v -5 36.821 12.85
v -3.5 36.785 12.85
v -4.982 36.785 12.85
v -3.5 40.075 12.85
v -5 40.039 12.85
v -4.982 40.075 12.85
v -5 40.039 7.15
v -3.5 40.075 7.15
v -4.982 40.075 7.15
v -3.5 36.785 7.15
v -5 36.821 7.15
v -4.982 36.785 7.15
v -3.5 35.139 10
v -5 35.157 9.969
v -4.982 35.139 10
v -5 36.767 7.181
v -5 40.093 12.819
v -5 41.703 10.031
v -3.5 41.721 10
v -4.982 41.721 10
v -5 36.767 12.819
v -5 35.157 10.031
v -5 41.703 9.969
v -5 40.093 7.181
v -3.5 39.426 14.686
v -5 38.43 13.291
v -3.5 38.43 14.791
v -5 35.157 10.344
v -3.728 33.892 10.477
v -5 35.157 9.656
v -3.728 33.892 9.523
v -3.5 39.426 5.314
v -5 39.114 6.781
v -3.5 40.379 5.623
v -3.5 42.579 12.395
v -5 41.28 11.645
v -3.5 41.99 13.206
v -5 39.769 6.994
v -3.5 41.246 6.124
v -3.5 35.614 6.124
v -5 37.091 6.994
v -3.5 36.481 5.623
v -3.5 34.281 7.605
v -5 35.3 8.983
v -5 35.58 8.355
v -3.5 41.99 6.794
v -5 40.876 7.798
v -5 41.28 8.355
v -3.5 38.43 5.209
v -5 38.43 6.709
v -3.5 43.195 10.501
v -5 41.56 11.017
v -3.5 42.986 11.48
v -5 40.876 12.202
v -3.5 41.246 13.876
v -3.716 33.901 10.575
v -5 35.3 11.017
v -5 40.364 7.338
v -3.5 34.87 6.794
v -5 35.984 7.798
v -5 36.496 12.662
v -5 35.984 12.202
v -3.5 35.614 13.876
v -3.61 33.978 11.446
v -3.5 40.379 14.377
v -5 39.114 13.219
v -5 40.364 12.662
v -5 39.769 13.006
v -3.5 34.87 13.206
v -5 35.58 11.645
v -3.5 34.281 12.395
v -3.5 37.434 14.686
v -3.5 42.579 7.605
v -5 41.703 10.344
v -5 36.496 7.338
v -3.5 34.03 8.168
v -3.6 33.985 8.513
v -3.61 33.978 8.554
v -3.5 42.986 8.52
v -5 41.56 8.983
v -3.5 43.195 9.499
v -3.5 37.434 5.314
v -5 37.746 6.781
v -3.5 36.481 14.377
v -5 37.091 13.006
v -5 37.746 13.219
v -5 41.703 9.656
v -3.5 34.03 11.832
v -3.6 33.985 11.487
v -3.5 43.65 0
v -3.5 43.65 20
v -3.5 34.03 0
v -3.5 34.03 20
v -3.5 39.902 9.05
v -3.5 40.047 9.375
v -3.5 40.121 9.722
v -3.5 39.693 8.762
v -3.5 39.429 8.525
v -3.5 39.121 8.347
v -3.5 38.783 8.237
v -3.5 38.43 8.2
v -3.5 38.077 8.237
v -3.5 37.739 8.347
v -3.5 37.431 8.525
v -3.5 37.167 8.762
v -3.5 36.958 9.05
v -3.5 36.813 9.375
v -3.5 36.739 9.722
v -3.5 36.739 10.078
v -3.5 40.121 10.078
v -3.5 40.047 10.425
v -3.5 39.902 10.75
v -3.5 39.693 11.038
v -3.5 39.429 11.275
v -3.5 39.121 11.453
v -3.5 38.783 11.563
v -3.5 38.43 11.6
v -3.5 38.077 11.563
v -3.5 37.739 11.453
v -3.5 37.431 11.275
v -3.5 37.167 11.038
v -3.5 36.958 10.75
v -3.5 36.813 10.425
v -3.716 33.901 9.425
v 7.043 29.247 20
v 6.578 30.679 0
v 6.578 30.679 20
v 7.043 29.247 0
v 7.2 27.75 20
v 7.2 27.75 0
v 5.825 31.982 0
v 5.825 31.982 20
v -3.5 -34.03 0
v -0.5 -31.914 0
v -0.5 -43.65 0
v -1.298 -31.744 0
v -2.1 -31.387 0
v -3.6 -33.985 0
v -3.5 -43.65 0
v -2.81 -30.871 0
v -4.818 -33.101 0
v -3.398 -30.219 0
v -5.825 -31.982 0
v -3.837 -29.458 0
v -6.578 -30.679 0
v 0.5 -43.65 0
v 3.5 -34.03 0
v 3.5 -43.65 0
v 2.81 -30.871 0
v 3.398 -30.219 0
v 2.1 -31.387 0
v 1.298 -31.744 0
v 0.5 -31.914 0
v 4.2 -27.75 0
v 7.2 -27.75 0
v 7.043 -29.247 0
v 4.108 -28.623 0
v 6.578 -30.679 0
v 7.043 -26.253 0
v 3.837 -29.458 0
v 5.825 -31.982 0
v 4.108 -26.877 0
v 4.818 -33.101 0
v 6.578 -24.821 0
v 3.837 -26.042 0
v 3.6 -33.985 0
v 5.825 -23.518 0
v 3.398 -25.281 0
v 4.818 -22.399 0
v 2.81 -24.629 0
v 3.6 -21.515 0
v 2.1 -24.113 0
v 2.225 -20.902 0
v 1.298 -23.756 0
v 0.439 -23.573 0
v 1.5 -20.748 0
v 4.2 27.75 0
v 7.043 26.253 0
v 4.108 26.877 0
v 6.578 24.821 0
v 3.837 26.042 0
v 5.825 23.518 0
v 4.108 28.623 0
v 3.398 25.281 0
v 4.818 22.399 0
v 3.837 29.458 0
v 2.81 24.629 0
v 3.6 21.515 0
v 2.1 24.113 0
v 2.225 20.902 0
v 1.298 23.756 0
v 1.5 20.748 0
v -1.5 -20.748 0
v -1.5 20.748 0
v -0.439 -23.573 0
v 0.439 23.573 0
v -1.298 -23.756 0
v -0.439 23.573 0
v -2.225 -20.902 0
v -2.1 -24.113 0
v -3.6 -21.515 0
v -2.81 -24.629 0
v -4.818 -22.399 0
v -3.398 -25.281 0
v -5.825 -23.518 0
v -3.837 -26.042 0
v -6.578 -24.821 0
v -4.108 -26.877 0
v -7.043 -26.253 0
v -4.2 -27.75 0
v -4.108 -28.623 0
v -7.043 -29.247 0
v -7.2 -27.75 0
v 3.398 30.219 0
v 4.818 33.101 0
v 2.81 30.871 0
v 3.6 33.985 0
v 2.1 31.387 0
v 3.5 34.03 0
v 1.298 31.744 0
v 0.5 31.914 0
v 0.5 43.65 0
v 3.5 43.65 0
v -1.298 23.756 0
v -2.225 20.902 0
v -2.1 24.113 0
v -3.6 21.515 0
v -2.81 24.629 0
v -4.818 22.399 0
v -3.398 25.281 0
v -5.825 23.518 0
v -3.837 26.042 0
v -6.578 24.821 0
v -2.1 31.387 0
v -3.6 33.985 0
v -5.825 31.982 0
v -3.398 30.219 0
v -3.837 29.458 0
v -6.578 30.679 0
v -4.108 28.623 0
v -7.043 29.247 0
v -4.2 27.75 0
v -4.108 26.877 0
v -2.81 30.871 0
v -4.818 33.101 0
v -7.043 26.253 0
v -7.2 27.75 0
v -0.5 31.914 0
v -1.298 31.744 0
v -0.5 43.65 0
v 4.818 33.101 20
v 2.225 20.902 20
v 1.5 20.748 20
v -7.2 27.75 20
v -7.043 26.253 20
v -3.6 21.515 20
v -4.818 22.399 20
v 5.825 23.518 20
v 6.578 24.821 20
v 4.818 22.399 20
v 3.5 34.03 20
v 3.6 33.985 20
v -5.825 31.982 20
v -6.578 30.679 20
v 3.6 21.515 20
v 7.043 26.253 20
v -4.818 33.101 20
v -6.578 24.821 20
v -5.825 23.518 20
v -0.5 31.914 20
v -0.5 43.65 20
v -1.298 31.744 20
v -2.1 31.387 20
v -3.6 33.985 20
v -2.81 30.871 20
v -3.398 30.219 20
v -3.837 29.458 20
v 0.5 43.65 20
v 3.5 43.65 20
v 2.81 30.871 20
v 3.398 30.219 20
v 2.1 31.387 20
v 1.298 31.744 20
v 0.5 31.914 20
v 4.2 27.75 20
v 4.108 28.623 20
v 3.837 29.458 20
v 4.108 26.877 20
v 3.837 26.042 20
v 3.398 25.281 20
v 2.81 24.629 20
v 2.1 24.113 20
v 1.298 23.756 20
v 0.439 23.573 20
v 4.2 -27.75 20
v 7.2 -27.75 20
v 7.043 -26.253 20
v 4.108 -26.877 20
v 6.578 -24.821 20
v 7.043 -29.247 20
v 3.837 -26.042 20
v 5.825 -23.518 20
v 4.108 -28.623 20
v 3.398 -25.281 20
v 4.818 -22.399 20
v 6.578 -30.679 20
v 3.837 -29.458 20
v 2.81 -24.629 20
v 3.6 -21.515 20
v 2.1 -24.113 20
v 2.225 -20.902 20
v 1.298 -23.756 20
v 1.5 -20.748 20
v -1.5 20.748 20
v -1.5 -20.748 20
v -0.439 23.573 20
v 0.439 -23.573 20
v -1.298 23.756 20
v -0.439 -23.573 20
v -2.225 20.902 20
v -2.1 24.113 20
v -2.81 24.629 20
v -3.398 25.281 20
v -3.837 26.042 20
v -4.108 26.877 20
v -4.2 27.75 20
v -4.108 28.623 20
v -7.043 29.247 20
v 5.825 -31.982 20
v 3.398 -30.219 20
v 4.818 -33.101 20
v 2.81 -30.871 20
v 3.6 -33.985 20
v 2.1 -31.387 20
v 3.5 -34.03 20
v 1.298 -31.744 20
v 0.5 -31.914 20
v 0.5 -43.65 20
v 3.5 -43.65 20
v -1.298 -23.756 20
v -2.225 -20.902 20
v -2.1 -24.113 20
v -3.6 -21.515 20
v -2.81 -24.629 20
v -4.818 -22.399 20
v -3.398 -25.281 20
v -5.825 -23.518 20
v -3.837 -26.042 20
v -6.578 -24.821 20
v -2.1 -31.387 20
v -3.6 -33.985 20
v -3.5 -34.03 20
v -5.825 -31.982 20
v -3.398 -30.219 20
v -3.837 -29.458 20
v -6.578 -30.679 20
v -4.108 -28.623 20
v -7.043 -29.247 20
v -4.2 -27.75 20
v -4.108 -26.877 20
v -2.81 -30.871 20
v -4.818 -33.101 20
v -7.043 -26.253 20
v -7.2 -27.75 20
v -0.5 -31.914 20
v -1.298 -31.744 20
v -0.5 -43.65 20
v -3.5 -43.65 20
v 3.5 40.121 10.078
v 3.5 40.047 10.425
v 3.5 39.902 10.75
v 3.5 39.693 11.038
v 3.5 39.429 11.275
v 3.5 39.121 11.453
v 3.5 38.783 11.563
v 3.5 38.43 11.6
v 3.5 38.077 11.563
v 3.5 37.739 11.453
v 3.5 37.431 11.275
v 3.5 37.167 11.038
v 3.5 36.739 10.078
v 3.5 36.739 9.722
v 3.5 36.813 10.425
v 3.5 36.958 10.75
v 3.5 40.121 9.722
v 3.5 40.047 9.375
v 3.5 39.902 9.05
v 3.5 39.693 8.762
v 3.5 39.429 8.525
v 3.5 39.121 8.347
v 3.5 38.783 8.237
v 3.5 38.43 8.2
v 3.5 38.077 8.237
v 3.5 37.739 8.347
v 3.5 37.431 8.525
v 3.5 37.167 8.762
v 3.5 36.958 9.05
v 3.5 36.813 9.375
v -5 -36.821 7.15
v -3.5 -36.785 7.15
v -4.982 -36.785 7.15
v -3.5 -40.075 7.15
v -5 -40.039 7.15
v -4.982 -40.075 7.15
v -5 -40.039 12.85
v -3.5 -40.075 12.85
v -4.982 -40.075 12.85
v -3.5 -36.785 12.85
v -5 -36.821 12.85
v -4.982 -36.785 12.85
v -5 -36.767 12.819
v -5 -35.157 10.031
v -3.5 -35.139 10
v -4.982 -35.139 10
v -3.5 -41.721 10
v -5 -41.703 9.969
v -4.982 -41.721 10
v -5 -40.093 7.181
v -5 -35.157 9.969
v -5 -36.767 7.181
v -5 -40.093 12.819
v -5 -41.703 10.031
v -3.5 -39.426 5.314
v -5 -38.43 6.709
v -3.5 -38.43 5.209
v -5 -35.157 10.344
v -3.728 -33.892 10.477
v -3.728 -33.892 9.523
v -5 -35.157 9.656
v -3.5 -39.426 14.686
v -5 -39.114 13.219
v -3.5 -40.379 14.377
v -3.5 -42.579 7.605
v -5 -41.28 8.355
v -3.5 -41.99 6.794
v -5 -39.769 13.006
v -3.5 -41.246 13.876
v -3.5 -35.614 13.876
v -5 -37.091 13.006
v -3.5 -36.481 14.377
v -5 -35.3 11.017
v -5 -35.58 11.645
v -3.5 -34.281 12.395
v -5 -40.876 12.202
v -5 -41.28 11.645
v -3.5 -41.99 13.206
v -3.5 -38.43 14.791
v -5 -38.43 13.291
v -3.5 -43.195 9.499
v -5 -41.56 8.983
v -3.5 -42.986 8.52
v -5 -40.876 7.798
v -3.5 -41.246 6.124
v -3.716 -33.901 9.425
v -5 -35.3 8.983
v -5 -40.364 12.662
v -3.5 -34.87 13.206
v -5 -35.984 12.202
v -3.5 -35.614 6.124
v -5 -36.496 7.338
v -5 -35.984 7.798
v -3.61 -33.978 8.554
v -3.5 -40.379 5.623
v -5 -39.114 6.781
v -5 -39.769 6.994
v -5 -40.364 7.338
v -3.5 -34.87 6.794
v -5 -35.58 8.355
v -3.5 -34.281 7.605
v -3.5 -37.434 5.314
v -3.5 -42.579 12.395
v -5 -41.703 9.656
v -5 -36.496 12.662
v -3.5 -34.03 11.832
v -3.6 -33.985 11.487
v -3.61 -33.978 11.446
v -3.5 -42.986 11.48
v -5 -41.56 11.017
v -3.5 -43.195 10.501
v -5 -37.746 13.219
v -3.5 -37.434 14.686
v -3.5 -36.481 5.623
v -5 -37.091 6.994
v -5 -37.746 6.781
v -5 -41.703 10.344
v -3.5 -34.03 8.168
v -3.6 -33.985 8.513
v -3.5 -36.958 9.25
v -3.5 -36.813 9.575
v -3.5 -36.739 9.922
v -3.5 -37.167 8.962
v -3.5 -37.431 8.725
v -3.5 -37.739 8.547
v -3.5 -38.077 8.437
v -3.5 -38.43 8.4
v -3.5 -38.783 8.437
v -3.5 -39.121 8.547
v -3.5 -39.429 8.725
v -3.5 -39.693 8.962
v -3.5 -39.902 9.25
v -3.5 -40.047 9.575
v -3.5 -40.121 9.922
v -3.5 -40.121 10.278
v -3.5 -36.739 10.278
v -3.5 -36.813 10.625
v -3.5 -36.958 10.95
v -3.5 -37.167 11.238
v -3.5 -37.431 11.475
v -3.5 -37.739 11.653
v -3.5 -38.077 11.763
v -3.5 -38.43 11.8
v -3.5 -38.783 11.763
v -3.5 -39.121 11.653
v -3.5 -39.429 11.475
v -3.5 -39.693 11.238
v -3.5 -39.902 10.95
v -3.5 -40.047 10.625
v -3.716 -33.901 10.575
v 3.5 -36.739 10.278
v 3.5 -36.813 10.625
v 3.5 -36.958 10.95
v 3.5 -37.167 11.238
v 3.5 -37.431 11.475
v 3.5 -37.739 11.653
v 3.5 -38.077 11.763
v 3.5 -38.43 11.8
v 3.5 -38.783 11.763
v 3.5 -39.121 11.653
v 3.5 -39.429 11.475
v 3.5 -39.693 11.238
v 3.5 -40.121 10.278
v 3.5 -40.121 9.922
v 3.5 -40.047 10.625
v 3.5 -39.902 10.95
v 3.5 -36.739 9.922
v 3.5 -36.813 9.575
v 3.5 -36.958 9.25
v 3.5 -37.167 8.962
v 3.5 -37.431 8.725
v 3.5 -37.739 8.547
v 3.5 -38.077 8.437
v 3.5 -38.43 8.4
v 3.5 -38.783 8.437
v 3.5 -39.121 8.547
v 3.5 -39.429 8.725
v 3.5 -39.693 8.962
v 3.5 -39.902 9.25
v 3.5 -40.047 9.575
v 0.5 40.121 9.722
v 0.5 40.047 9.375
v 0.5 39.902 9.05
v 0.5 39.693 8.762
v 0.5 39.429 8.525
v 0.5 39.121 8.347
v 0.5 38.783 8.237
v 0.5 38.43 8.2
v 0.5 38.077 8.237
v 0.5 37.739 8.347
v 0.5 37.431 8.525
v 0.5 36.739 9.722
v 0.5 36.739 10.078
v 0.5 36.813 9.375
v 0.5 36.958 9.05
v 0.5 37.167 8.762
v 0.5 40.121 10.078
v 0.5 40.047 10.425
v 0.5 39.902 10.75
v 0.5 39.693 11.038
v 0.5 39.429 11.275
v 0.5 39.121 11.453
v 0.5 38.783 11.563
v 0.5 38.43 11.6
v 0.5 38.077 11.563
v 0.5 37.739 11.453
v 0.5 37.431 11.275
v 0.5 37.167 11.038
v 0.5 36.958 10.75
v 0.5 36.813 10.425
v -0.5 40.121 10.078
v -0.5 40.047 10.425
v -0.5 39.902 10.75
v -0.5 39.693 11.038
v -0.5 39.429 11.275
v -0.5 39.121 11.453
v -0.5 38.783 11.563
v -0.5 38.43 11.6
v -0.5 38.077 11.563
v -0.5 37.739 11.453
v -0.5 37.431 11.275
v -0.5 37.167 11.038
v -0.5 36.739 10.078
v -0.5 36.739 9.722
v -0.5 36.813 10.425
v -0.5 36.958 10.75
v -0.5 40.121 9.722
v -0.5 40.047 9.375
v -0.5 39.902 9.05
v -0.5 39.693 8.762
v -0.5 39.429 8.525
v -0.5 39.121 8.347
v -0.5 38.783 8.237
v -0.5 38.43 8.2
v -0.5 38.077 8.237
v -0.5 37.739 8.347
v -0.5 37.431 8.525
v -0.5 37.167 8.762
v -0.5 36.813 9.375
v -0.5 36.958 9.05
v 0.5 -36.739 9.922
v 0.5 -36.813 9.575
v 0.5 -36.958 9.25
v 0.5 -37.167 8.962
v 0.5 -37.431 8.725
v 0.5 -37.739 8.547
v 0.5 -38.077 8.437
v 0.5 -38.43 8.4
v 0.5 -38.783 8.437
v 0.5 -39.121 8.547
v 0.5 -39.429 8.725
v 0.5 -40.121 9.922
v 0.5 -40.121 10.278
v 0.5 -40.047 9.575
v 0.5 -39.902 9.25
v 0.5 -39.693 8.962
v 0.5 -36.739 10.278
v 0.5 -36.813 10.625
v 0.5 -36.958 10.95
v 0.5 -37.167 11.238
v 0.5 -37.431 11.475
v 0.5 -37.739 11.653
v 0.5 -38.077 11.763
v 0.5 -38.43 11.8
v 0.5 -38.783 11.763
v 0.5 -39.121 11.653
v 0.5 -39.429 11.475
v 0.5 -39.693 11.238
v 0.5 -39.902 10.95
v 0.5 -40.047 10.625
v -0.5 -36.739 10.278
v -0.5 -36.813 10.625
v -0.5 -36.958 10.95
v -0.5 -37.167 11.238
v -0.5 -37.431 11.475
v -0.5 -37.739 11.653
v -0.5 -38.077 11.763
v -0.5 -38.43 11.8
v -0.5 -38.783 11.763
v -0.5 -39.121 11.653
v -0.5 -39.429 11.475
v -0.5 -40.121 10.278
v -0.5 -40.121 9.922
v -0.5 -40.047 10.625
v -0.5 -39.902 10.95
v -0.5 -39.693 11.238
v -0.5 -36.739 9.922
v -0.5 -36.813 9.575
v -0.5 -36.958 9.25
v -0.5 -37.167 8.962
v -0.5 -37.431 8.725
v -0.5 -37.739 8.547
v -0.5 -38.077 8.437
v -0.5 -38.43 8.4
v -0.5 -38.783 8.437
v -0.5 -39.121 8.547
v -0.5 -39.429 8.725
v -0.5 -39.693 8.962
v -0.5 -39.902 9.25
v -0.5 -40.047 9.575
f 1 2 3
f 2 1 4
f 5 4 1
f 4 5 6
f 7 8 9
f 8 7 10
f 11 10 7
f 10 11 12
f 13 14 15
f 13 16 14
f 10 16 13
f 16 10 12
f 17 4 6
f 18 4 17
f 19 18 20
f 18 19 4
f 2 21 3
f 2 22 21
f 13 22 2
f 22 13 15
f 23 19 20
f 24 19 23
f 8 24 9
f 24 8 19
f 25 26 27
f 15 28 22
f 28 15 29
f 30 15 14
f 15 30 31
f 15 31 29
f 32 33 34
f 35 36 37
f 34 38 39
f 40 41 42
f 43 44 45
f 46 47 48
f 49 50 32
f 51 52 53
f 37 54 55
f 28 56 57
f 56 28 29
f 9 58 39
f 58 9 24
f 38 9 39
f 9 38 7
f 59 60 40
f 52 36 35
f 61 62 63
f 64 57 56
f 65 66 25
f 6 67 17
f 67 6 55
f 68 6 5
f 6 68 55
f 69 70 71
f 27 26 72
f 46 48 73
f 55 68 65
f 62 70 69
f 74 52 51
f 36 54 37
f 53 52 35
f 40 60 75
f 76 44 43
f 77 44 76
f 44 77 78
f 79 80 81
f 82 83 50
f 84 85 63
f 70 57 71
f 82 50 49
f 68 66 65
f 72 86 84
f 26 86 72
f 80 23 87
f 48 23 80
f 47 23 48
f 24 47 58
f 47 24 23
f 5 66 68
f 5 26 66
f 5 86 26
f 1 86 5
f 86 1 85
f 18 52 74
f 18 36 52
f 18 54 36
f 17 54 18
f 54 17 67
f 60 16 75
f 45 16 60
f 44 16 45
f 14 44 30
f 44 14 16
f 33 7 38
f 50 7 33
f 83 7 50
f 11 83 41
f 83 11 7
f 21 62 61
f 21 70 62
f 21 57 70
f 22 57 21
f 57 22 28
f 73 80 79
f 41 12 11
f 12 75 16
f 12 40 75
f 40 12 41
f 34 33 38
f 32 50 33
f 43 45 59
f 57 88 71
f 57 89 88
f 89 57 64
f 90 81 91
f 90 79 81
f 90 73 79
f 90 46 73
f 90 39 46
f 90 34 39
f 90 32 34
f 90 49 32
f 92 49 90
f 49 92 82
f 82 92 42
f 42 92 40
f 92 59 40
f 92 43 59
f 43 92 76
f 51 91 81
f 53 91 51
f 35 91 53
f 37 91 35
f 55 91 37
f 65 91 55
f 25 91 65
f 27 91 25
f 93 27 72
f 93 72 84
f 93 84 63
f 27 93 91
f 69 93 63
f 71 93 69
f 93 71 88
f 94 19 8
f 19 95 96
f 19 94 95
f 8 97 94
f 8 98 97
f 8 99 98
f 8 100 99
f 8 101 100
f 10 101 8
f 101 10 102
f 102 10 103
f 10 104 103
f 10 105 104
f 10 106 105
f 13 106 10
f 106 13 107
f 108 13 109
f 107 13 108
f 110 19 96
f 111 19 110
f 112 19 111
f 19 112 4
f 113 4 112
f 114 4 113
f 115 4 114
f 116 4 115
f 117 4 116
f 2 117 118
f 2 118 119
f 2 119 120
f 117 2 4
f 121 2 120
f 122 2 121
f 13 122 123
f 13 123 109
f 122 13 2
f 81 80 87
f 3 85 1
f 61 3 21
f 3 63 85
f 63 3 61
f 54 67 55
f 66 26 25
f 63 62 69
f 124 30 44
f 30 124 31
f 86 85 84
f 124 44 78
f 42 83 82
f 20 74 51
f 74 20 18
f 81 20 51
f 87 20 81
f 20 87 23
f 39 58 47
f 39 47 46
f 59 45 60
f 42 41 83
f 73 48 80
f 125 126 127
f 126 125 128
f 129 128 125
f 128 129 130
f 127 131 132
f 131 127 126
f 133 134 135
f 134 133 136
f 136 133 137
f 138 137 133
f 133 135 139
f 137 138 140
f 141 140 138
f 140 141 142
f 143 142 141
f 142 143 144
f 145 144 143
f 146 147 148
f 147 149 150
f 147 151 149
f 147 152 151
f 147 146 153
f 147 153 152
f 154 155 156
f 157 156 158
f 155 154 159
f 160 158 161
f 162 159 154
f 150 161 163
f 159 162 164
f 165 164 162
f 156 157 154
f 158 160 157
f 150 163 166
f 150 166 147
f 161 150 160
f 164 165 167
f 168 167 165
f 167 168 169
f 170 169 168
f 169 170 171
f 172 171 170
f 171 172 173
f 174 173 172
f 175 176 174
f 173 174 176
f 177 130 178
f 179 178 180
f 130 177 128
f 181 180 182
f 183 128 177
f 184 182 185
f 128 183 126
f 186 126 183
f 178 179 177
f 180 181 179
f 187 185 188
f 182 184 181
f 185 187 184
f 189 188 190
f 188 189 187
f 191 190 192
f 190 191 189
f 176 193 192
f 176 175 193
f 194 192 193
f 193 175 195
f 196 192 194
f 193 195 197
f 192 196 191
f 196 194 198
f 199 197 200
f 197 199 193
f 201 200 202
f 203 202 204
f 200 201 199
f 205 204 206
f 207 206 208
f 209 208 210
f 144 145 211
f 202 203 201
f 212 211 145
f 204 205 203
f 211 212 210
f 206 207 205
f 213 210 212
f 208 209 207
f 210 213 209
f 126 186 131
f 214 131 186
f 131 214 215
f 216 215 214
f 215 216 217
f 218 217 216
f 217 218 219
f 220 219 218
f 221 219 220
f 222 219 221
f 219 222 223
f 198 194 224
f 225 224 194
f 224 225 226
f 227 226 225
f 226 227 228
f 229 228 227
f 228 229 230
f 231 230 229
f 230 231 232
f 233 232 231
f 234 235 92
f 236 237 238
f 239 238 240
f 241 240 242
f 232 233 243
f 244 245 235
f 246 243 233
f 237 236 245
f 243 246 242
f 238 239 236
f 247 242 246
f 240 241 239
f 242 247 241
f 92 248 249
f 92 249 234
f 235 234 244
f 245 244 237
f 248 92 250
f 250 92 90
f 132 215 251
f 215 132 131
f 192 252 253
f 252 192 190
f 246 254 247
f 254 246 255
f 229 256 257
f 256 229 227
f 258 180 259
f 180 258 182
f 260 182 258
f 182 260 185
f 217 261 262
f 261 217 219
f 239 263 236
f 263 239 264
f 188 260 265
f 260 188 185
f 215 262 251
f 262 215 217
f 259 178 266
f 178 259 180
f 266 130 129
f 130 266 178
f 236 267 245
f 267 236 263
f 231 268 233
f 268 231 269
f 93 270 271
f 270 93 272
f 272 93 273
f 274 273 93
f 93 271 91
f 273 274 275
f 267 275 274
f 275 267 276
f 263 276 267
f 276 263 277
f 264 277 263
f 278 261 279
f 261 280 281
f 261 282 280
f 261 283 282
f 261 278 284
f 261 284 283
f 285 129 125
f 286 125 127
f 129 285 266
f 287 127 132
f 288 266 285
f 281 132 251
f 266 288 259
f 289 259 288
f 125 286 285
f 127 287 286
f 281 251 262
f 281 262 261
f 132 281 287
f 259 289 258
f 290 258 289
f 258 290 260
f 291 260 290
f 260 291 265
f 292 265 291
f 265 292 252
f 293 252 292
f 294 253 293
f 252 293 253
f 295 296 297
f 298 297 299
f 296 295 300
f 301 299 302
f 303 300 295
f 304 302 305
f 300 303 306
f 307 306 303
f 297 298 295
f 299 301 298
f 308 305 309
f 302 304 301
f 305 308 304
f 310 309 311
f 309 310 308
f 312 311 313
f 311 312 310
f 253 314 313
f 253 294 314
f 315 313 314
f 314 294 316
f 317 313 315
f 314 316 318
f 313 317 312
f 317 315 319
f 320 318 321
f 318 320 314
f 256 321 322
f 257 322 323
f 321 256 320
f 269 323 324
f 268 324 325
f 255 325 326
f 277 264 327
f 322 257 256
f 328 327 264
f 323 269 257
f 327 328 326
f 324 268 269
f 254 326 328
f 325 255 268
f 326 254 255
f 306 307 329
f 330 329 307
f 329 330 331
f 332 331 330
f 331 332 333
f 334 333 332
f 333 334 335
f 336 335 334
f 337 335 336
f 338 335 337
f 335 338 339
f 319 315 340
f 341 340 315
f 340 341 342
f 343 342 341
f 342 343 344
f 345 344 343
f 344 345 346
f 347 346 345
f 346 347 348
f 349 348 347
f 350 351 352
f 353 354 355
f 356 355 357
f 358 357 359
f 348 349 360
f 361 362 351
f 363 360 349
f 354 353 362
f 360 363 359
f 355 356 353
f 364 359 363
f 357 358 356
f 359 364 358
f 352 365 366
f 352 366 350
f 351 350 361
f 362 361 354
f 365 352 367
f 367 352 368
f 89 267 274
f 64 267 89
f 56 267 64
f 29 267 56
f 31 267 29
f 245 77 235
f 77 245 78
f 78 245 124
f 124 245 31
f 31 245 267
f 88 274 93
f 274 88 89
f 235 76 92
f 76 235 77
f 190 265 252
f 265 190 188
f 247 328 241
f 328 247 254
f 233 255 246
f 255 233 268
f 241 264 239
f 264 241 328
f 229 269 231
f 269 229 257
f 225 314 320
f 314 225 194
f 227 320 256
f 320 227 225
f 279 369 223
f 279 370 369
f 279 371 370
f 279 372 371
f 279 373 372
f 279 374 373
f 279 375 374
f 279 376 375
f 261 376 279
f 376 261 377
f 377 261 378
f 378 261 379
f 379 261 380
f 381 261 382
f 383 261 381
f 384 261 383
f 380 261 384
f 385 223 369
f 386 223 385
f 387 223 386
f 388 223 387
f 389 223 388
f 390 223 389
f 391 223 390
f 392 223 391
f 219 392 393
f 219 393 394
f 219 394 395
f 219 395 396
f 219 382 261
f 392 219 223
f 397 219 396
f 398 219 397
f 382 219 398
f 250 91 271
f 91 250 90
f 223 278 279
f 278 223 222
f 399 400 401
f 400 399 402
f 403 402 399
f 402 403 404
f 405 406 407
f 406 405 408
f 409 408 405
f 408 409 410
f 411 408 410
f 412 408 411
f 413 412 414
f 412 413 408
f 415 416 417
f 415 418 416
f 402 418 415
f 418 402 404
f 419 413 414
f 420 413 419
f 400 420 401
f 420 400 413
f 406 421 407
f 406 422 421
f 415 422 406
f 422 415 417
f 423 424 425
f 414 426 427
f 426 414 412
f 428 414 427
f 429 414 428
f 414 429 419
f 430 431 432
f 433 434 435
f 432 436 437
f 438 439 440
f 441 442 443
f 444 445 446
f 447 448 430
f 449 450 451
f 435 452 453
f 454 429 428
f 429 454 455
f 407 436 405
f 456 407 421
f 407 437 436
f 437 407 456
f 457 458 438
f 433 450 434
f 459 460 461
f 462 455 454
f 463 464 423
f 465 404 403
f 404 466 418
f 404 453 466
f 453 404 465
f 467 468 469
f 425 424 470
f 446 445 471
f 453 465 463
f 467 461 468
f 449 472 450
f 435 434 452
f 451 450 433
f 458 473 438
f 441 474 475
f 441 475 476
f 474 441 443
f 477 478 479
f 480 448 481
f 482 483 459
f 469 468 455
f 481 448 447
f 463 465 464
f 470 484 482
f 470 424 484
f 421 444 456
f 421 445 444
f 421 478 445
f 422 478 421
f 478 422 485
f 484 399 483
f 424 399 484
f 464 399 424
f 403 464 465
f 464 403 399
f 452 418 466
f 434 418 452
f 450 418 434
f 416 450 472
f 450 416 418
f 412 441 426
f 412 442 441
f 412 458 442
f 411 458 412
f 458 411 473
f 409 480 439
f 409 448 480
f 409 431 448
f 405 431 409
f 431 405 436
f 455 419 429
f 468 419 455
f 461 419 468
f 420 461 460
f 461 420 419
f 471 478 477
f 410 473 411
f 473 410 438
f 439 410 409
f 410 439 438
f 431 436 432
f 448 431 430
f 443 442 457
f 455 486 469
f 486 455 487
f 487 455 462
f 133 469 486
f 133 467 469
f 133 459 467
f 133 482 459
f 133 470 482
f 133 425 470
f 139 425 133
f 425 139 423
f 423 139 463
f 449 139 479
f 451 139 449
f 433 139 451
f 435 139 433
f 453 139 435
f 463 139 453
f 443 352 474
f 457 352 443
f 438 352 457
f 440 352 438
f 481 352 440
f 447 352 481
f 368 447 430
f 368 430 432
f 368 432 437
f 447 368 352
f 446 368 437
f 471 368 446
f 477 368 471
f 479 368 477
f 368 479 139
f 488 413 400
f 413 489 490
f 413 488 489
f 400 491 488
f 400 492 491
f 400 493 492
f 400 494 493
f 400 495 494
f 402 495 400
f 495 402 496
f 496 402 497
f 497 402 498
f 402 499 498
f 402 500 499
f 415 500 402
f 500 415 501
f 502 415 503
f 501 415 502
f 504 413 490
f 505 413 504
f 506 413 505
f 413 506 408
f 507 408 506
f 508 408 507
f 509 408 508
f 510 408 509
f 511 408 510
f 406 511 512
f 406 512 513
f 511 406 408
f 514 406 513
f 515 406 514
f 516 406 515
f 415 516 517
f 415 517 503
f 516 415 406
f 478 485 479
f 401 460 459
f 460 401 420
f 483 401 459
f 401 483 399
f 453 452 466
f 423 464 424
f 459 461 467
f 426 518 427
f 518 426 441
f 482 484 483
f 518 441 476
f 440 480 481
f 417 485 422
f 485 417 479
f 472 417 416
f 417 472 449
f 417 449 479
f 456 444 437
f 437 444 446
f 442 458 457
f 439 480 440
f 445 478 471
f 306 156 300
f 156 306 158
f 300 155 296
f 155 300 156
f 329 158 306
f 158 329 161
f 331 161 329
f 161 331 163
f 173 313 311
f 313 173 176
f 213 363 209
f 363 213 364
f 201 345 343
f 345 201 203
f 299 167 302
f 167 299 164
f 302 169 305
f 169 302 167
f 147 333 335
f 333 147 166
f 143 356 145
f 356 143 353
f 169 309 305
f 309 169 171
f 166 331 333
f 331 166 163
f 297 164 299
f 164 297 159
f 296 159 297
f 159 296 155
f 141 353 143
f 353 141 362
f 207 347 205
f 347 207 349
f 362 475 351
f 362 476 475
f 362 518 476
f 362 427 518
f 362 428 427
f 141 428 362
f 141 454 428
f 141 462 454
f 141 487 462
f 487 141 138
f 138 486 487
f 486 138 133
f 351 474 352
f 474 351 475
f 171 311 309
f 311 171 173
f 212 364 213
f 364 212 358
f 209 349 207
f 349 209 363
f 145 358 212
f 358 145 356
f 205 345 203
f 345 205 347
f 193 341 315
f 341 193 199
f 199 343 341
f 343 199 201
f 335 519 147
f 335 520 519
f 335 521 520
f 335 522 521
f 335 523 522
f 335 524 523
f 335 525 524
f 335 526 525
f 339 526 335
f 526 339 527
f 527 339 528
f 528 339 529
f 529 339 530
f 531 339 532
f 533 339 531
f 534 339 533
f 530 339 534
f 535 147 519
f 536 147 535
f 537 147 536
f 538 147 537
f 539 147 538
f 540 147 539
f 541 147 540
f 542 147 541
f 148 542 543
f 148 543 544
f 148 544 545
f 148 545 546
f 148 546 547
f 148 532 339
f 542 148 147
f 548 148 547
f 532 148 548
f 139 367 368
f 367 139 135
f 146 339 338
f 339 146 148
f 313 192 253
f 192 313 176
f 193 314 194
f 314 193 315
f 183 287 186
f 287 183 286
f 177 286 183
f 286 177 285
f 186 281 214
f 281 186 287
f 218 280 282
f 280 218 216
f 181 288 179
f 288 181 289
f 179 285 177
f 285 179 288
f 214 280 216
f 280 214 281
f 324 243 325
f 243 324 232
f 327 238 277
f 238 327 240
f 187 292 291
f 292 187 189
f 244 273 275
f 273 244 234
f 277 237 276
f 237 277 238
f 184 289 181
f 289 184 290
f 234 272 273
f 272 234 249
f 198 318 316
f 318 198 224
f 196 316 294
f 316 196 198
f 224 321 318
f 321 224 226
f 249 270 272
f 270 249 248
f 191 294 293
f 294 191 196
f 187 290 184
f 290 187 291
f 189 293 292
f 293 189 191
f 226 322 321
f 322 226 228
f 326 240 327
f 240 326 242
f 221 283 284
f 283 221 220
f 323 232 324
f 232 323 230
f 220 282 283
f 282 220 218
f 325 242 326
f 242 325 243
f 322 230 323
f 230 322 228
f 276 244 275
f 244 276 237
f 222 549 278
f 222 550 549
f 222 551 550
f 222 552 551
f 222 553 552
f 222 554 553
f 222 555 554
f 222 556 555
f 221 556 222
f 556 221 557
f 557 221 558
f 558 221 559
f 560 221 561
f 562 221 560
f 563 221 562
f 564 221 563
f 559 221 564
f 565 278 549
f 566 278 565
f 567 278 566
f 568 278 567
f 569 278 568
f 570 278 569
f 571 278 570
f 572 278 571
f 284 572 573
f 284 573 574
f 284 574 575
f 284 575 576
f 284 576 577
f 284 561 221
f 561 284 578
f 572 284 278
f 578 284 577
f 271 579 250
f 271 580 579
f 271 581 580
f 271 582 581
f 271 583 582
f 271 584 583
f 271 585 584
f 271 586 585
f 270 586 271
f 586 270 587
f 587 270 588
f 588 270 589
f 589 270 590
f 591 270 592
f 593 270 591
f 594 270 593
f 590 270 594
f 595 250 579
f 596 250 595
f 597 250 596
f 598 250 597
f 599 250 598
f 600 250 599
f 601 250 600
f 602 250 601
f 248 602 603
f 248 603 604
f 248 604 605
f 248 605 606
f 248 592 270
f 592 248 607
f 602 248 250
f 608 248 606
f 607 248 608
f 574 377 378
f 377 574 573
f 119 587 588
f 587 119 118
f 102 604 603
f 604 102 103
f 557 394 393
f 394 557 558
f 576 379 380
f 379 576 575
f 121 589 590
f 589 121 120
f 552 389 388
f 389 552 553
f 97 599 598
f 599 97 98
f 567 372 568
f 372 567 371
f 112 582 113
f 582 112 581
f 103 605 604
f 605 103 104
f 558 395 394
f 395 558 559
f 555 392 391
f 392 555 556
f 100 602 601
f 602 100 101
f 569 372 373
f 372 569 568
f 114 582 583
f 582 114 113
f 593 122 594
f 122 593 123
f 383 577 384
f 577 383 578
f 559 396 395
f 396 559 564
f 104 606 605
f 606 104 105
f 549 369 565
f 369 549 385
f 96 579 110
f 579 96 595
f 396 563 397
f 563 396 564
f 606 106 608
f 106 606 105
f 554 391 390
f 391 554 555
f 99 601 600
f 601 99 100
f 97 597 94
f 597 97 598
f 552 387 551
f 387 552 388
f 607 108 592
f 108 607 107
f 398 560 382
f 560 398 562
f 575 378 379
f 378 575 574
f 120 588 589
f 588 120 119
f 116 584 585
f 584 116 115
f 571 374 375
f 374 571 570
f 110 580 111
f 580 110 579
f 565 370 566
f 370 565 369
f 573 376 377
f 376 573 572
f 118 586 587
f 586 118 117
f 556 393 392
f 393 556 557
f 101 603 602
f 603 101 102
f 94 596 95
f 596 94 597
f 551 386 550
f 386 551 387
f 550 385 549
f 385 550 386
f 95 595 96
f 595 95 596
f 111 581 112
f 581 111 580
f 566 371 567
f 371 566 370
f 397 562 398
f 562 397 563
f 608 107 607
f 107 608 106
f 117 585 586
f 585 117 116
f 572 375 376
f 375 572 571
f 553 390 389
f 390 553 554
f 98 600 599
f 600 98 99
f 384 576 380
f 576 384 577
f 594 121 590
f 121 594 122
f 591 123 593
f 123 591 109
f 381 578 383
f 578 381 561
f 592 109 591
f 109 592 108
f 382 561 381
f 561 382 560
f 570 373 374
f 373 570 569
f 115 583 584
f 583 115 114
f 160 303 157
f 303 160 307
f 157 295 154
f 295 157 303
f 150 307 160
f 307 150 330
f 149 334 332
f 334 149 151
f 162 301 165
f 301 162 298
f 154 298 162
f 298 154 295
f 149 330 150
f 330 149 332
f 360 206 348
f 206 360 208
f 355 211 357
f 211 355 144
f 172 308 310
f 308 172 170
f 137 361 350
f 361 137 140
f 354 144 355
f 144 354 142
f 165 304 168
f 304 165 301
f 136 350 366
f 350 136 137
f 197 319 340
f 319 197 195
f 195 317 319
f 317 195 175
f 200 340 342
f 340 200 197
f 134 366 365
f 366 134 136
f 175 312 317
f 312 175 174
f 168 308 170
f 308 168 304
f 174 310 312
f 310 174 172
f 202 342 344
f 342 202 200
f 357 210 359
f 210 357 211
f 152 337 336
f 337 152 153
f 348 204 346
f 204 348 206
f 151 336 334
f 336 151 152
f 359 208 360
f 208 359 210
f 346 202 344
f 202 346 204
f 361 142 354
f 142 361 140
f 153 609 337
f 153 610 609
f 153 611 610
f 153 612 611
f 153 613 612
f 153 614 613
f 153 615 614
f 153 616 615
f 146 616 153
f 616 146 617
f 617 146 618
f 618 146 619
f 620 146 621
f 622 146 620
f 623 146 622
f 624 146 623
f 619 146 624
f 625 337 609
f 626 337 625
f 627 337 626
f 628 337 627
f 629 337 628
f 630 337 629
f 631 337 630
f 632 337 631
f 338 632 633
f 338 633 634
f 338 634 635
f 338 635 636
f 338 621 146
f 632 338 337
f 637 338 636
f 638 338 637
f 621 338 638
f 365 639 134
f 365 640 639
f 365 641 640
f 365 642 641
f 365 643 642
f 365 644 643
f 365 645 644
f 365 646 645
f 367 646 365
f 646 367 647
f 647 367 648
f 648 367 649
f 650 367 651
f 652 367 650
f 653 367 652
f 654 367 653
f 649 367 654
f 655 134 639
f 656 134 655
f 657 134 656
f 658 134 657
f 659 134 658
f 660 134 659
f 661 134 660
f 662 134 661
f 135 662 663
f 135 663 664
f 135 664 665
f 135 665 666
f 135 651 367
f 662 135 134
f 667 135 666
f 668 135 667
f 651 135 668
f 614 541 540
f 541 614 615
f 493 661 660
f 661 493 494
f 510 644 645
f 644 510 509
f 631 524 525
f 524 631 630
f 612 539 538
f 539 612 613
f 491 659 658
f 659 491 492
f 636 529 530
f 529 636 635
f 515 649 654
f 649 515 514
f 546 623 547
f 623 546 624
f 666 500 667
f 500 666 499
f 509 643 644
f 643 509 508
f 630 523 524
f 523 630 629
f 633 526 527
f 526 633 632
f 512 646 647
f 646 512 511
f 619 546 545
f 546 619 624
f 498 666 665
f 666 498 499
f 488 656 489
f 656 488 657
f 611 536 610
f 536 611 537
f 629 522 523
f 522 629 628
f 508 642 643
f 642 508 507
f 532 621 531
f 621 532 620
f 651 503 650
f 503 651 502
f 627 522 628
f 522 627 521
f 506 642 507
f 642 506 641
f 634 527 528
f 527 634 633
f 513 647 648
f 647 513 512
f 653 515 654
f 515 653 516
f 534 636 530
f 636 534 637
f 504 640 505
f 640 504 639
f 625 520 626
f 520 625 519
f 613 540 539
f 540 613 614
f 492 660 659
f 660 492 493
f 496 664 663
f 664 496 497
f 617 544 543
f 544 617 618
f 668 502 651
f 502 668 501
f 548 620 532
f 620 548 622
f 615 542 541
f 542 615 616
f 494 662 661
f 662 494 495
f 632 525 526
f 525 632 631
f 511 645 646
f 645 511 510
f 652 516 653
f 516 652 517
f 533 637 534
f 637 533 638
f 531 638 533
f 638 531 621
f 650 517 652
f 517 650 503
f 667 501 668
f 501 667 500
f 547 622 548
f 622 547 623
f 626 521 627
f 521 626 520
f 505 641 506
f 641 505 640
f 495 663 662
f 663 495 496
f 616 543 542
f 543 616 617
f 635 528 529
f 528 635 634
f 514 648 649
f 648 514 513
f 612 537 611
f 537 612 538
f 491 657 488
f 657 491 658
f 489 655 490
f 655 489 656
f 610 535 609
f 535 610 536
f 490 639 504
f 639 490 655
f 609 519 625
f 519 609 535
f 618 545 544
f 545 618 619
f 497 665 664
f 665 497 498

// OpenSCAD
//
//  Mounting brackets for Quanum 680 and other platforms
//  that use twin tubes as equipment mounts
// 
//  by Egil Kvaleberg
//


// platform mounting tube diameter
mount_tube_dia = 8.4;  // leave some space to make fitting easier

// platform mounting tube distance
mount_tube_dist = 55.5;  // center to center (applies to dual)


// tune these:
// example: "dual" / 48 / 65 / 12 / 3
//          "single" / 40 / x / 12 / 3
//          "servo" / x / x / 12 / 3

// type of mounts
mount_type = "dual"; // [ dual, single, servo ]
// offset from center line, use 0 for flat bar
mount_offset = 0.0;
// exit angle from mount 		
mount_angle = 65;
// width of clamp		
mount_width = 20;  
// wall thickness		
mount_wall = 3;		   

//servo_flange_width = 28;
//servo_screw = 2.0;
//servo_flange_height = 16; // height to bottom of mount flange

// for servo mount: flange width
servo_flange_width = 35.0;
// for servo mount: screw diameter
servo_screw = 2.5;
// for servo mount: height to bottom of mount flange
servo_flange_height = 20.0; 

// gap of flange
mount_gap = 1.0;
// mount screw diameter
screw = 3.0; // M3 is 3.0 and M2.5 is 2.5	 
// nut, across flats
nut = 5.5;    // M3 is 5.5
// nut height
nut_h = 1.5;    // M3
mount_screw = screw + 0.2;
nut_w = nut + 0.2; 
mount_flange = nut_w+2*nut_h;  // depth of flange

j = 1*0.1;
$fs = 1*0.1;

module nut_cage() {	
	difference ( ) {
		cylinder(r1 = (nut_w/2)/cos(30) + nut_h, r2 = (nut_w/2)/cos(30), h = nut_h);
		translate([0, 0, nut_h/2]) union () {
			cube([nut_w, tan(30)*nut_w, nut_h+j], center=true);
			rotate ([0, 0, 60]) cube([nut_w, tan(30)*nut_w, nut_h+j], center=true);
			rotate ([0, 0, 120])cube([nut_w, tan(30)*nut_w, nut_h+j], center=true);
		}
	}
}

module Mount_Flange_add()
{
	union () {
		cylinder(r = mount_tube_dia/2 + mount_wall, h = mount_width);
		translate([-(2*mount_wall+mount_gap)/2, 0, 0]) cube([2*mount_wall+mount_gap, mount_tube_dia/2+mount_wall+mount_flange, mount_width]);
		translate([-(mount_wall+mount_gap/2), mount_tube_dia/2 + mount_wall + mount_flange*.4, mount_width/2]) rotate([0, -90, 0]) nut_cage(); // screw hole
	}
}

module Mount_Flange_sub()
{
	translate([0, 0, -j]) union () {
		cylinder(r = mount_tube_dia/2, h = mount_width+2*j);
		translate([-mount_gap/2, 0, 0]) cube([mount_gap, mount_tube_dia/2+mount_width, mount_width+2*j]);
		translate([-(2*mount_wall+mount_gap+2*j)/2, mount_tube_dia/2 + mount_wall + mount_flange*.4, mount_width/2]) rotate([0, 90, 0]) cylinder(r = mount_screw/2 + 0.1, h = 2*mount_wall+mount_gap+2*j); // screw hole
	}
}

module Mount_Beam(gap, length)
{		
	translate([-mount_wall/2, gap, 0]) cube([mount_wall, length, mount_width]);
}

module Mount_Dual(offset, angle)
{
	leg = offset/cos(90-angle)-mount_tube_dia/2;
	color([0, 200/255, 0, 0.5])
	difference () {
		union () {
			translate([0, mount_tube_dist/2, 0]) Mount_Flange_add();
			translate([0, -mount_tube_dist/2, 0]) translate([0, 0, mount_width]) rotate([180, 0, 0]) Mount_Flange_add();

			if (leg > 0) {
				// left part	
				translate([0, -mount_tube_dist/2, 0]) rotate([0, 0, angle]) Mount_Beam(mount_tube_dia/2, leg);
				translate([-offset, offset/tan(angle)-mount_tube_dist/2, 0]) cylinder(r = mount_wall/2, h = mount_width);
				// straight part	
				translate([-offset, -mount_tube_dist/2, 0]) Mount_Beam(offset/tan(angle), mount_tube_dist - 2*offset/tan(angle));

				// right part	
				translate([0, mount_tube_dist/2, 0]) rotate([0, 0, 180-angle]) Mount_Beam(mount_tube_dia/2, leg);
				translate([-offset, -offset/tan(angle)+mount_tube_dist/2, 0]) cylinder(r = mount_wall/2, h = mount_width);
			} else {
				// straight part
				translate([0, -mount_tube_dist/2, 0]) Mount_Beam(offset/tan(angle), mount_tube_dist - 2*offset/tan(angle));
			}
		}
		union () {
			translate([0, mount_tube_dist/2, 0]) Mount_Flange_sub();
			translate([0, -mount_tube_dist/2, 0]) translate([0, 0, mount_width]) rotate([180, 0, 0]) Mount_Flange_sub();
		}
	}
}

module Mount_single(leg)
{
	color([0, 200/255, 0, 0.5])
	difference () {
		union () {
			 translate([0, 0, mount_width]) rotate([180, 0, 0]) Mount_Flange_add();

			// straight part
			Mount_Beam(mount_tube_dia/2, leg - mount_tube_dia/2);

		}
		union () {
			translate([0, 0, mount_width]) rotate([180, 0, 0]) Mount_Flange_sub();
		}
	}
}


module Mount_servo(dist)
{
	module column(dx)
	{
		translate([dx, mount_tube_dia/2, 0]) {
			difference() {
				union() {
					cube([mount_wall, mount_wall+servo_flange_height, mount_width]);
					translate([mount_wall/2, mount_wall+servo_flange_height, mount_width/2]) rotate([90, 0, 0]) cylinder(r = 1.0+servo_screw/2, h = 1.0 + servo_flange_height/2); 
				}
				// hole for servo mounting screw
				translate([mount_wall/2, mount_wall+servo_flange_height+j, mount_width/2]) rotate([90, 0, 0]) cylinder(r = servo_screw/2, h = j+servo_flange_height/2); 
			}
		}
	}

	//color([0, 200/255, 0, 0.5])
	difference () {
		union () {
			 translate([0, 0, mount_width]) rotate([180, 0, 0]) Mount_Flange_add();

			// servo
			column(-mount_tube_dia/2 - mount_wall);
			column(dist - mount_tube_dia/2 - mount_wall);
			translate([-mount_tube_dia/2 - mount_wall, mount_tube_dia/2, 0]) cube([dist+mount_wall, mount_wall, mount_width]);

		}
		union () {
			translate([0, 0, mount_width]) rotate([180, 0, 0]) Mount_Flange_sub();
		}
	}
}


module view()
{
	if (mount_type == "dual") Mount_Dual(mount_offset, mount_angle);
	else if (mount_type == "single") Mount_single(mount_offset);
	else if (mount_type == "servo") Mount_servo(mount_offset);
	else echo("Unknow mount_type");
}

view();
